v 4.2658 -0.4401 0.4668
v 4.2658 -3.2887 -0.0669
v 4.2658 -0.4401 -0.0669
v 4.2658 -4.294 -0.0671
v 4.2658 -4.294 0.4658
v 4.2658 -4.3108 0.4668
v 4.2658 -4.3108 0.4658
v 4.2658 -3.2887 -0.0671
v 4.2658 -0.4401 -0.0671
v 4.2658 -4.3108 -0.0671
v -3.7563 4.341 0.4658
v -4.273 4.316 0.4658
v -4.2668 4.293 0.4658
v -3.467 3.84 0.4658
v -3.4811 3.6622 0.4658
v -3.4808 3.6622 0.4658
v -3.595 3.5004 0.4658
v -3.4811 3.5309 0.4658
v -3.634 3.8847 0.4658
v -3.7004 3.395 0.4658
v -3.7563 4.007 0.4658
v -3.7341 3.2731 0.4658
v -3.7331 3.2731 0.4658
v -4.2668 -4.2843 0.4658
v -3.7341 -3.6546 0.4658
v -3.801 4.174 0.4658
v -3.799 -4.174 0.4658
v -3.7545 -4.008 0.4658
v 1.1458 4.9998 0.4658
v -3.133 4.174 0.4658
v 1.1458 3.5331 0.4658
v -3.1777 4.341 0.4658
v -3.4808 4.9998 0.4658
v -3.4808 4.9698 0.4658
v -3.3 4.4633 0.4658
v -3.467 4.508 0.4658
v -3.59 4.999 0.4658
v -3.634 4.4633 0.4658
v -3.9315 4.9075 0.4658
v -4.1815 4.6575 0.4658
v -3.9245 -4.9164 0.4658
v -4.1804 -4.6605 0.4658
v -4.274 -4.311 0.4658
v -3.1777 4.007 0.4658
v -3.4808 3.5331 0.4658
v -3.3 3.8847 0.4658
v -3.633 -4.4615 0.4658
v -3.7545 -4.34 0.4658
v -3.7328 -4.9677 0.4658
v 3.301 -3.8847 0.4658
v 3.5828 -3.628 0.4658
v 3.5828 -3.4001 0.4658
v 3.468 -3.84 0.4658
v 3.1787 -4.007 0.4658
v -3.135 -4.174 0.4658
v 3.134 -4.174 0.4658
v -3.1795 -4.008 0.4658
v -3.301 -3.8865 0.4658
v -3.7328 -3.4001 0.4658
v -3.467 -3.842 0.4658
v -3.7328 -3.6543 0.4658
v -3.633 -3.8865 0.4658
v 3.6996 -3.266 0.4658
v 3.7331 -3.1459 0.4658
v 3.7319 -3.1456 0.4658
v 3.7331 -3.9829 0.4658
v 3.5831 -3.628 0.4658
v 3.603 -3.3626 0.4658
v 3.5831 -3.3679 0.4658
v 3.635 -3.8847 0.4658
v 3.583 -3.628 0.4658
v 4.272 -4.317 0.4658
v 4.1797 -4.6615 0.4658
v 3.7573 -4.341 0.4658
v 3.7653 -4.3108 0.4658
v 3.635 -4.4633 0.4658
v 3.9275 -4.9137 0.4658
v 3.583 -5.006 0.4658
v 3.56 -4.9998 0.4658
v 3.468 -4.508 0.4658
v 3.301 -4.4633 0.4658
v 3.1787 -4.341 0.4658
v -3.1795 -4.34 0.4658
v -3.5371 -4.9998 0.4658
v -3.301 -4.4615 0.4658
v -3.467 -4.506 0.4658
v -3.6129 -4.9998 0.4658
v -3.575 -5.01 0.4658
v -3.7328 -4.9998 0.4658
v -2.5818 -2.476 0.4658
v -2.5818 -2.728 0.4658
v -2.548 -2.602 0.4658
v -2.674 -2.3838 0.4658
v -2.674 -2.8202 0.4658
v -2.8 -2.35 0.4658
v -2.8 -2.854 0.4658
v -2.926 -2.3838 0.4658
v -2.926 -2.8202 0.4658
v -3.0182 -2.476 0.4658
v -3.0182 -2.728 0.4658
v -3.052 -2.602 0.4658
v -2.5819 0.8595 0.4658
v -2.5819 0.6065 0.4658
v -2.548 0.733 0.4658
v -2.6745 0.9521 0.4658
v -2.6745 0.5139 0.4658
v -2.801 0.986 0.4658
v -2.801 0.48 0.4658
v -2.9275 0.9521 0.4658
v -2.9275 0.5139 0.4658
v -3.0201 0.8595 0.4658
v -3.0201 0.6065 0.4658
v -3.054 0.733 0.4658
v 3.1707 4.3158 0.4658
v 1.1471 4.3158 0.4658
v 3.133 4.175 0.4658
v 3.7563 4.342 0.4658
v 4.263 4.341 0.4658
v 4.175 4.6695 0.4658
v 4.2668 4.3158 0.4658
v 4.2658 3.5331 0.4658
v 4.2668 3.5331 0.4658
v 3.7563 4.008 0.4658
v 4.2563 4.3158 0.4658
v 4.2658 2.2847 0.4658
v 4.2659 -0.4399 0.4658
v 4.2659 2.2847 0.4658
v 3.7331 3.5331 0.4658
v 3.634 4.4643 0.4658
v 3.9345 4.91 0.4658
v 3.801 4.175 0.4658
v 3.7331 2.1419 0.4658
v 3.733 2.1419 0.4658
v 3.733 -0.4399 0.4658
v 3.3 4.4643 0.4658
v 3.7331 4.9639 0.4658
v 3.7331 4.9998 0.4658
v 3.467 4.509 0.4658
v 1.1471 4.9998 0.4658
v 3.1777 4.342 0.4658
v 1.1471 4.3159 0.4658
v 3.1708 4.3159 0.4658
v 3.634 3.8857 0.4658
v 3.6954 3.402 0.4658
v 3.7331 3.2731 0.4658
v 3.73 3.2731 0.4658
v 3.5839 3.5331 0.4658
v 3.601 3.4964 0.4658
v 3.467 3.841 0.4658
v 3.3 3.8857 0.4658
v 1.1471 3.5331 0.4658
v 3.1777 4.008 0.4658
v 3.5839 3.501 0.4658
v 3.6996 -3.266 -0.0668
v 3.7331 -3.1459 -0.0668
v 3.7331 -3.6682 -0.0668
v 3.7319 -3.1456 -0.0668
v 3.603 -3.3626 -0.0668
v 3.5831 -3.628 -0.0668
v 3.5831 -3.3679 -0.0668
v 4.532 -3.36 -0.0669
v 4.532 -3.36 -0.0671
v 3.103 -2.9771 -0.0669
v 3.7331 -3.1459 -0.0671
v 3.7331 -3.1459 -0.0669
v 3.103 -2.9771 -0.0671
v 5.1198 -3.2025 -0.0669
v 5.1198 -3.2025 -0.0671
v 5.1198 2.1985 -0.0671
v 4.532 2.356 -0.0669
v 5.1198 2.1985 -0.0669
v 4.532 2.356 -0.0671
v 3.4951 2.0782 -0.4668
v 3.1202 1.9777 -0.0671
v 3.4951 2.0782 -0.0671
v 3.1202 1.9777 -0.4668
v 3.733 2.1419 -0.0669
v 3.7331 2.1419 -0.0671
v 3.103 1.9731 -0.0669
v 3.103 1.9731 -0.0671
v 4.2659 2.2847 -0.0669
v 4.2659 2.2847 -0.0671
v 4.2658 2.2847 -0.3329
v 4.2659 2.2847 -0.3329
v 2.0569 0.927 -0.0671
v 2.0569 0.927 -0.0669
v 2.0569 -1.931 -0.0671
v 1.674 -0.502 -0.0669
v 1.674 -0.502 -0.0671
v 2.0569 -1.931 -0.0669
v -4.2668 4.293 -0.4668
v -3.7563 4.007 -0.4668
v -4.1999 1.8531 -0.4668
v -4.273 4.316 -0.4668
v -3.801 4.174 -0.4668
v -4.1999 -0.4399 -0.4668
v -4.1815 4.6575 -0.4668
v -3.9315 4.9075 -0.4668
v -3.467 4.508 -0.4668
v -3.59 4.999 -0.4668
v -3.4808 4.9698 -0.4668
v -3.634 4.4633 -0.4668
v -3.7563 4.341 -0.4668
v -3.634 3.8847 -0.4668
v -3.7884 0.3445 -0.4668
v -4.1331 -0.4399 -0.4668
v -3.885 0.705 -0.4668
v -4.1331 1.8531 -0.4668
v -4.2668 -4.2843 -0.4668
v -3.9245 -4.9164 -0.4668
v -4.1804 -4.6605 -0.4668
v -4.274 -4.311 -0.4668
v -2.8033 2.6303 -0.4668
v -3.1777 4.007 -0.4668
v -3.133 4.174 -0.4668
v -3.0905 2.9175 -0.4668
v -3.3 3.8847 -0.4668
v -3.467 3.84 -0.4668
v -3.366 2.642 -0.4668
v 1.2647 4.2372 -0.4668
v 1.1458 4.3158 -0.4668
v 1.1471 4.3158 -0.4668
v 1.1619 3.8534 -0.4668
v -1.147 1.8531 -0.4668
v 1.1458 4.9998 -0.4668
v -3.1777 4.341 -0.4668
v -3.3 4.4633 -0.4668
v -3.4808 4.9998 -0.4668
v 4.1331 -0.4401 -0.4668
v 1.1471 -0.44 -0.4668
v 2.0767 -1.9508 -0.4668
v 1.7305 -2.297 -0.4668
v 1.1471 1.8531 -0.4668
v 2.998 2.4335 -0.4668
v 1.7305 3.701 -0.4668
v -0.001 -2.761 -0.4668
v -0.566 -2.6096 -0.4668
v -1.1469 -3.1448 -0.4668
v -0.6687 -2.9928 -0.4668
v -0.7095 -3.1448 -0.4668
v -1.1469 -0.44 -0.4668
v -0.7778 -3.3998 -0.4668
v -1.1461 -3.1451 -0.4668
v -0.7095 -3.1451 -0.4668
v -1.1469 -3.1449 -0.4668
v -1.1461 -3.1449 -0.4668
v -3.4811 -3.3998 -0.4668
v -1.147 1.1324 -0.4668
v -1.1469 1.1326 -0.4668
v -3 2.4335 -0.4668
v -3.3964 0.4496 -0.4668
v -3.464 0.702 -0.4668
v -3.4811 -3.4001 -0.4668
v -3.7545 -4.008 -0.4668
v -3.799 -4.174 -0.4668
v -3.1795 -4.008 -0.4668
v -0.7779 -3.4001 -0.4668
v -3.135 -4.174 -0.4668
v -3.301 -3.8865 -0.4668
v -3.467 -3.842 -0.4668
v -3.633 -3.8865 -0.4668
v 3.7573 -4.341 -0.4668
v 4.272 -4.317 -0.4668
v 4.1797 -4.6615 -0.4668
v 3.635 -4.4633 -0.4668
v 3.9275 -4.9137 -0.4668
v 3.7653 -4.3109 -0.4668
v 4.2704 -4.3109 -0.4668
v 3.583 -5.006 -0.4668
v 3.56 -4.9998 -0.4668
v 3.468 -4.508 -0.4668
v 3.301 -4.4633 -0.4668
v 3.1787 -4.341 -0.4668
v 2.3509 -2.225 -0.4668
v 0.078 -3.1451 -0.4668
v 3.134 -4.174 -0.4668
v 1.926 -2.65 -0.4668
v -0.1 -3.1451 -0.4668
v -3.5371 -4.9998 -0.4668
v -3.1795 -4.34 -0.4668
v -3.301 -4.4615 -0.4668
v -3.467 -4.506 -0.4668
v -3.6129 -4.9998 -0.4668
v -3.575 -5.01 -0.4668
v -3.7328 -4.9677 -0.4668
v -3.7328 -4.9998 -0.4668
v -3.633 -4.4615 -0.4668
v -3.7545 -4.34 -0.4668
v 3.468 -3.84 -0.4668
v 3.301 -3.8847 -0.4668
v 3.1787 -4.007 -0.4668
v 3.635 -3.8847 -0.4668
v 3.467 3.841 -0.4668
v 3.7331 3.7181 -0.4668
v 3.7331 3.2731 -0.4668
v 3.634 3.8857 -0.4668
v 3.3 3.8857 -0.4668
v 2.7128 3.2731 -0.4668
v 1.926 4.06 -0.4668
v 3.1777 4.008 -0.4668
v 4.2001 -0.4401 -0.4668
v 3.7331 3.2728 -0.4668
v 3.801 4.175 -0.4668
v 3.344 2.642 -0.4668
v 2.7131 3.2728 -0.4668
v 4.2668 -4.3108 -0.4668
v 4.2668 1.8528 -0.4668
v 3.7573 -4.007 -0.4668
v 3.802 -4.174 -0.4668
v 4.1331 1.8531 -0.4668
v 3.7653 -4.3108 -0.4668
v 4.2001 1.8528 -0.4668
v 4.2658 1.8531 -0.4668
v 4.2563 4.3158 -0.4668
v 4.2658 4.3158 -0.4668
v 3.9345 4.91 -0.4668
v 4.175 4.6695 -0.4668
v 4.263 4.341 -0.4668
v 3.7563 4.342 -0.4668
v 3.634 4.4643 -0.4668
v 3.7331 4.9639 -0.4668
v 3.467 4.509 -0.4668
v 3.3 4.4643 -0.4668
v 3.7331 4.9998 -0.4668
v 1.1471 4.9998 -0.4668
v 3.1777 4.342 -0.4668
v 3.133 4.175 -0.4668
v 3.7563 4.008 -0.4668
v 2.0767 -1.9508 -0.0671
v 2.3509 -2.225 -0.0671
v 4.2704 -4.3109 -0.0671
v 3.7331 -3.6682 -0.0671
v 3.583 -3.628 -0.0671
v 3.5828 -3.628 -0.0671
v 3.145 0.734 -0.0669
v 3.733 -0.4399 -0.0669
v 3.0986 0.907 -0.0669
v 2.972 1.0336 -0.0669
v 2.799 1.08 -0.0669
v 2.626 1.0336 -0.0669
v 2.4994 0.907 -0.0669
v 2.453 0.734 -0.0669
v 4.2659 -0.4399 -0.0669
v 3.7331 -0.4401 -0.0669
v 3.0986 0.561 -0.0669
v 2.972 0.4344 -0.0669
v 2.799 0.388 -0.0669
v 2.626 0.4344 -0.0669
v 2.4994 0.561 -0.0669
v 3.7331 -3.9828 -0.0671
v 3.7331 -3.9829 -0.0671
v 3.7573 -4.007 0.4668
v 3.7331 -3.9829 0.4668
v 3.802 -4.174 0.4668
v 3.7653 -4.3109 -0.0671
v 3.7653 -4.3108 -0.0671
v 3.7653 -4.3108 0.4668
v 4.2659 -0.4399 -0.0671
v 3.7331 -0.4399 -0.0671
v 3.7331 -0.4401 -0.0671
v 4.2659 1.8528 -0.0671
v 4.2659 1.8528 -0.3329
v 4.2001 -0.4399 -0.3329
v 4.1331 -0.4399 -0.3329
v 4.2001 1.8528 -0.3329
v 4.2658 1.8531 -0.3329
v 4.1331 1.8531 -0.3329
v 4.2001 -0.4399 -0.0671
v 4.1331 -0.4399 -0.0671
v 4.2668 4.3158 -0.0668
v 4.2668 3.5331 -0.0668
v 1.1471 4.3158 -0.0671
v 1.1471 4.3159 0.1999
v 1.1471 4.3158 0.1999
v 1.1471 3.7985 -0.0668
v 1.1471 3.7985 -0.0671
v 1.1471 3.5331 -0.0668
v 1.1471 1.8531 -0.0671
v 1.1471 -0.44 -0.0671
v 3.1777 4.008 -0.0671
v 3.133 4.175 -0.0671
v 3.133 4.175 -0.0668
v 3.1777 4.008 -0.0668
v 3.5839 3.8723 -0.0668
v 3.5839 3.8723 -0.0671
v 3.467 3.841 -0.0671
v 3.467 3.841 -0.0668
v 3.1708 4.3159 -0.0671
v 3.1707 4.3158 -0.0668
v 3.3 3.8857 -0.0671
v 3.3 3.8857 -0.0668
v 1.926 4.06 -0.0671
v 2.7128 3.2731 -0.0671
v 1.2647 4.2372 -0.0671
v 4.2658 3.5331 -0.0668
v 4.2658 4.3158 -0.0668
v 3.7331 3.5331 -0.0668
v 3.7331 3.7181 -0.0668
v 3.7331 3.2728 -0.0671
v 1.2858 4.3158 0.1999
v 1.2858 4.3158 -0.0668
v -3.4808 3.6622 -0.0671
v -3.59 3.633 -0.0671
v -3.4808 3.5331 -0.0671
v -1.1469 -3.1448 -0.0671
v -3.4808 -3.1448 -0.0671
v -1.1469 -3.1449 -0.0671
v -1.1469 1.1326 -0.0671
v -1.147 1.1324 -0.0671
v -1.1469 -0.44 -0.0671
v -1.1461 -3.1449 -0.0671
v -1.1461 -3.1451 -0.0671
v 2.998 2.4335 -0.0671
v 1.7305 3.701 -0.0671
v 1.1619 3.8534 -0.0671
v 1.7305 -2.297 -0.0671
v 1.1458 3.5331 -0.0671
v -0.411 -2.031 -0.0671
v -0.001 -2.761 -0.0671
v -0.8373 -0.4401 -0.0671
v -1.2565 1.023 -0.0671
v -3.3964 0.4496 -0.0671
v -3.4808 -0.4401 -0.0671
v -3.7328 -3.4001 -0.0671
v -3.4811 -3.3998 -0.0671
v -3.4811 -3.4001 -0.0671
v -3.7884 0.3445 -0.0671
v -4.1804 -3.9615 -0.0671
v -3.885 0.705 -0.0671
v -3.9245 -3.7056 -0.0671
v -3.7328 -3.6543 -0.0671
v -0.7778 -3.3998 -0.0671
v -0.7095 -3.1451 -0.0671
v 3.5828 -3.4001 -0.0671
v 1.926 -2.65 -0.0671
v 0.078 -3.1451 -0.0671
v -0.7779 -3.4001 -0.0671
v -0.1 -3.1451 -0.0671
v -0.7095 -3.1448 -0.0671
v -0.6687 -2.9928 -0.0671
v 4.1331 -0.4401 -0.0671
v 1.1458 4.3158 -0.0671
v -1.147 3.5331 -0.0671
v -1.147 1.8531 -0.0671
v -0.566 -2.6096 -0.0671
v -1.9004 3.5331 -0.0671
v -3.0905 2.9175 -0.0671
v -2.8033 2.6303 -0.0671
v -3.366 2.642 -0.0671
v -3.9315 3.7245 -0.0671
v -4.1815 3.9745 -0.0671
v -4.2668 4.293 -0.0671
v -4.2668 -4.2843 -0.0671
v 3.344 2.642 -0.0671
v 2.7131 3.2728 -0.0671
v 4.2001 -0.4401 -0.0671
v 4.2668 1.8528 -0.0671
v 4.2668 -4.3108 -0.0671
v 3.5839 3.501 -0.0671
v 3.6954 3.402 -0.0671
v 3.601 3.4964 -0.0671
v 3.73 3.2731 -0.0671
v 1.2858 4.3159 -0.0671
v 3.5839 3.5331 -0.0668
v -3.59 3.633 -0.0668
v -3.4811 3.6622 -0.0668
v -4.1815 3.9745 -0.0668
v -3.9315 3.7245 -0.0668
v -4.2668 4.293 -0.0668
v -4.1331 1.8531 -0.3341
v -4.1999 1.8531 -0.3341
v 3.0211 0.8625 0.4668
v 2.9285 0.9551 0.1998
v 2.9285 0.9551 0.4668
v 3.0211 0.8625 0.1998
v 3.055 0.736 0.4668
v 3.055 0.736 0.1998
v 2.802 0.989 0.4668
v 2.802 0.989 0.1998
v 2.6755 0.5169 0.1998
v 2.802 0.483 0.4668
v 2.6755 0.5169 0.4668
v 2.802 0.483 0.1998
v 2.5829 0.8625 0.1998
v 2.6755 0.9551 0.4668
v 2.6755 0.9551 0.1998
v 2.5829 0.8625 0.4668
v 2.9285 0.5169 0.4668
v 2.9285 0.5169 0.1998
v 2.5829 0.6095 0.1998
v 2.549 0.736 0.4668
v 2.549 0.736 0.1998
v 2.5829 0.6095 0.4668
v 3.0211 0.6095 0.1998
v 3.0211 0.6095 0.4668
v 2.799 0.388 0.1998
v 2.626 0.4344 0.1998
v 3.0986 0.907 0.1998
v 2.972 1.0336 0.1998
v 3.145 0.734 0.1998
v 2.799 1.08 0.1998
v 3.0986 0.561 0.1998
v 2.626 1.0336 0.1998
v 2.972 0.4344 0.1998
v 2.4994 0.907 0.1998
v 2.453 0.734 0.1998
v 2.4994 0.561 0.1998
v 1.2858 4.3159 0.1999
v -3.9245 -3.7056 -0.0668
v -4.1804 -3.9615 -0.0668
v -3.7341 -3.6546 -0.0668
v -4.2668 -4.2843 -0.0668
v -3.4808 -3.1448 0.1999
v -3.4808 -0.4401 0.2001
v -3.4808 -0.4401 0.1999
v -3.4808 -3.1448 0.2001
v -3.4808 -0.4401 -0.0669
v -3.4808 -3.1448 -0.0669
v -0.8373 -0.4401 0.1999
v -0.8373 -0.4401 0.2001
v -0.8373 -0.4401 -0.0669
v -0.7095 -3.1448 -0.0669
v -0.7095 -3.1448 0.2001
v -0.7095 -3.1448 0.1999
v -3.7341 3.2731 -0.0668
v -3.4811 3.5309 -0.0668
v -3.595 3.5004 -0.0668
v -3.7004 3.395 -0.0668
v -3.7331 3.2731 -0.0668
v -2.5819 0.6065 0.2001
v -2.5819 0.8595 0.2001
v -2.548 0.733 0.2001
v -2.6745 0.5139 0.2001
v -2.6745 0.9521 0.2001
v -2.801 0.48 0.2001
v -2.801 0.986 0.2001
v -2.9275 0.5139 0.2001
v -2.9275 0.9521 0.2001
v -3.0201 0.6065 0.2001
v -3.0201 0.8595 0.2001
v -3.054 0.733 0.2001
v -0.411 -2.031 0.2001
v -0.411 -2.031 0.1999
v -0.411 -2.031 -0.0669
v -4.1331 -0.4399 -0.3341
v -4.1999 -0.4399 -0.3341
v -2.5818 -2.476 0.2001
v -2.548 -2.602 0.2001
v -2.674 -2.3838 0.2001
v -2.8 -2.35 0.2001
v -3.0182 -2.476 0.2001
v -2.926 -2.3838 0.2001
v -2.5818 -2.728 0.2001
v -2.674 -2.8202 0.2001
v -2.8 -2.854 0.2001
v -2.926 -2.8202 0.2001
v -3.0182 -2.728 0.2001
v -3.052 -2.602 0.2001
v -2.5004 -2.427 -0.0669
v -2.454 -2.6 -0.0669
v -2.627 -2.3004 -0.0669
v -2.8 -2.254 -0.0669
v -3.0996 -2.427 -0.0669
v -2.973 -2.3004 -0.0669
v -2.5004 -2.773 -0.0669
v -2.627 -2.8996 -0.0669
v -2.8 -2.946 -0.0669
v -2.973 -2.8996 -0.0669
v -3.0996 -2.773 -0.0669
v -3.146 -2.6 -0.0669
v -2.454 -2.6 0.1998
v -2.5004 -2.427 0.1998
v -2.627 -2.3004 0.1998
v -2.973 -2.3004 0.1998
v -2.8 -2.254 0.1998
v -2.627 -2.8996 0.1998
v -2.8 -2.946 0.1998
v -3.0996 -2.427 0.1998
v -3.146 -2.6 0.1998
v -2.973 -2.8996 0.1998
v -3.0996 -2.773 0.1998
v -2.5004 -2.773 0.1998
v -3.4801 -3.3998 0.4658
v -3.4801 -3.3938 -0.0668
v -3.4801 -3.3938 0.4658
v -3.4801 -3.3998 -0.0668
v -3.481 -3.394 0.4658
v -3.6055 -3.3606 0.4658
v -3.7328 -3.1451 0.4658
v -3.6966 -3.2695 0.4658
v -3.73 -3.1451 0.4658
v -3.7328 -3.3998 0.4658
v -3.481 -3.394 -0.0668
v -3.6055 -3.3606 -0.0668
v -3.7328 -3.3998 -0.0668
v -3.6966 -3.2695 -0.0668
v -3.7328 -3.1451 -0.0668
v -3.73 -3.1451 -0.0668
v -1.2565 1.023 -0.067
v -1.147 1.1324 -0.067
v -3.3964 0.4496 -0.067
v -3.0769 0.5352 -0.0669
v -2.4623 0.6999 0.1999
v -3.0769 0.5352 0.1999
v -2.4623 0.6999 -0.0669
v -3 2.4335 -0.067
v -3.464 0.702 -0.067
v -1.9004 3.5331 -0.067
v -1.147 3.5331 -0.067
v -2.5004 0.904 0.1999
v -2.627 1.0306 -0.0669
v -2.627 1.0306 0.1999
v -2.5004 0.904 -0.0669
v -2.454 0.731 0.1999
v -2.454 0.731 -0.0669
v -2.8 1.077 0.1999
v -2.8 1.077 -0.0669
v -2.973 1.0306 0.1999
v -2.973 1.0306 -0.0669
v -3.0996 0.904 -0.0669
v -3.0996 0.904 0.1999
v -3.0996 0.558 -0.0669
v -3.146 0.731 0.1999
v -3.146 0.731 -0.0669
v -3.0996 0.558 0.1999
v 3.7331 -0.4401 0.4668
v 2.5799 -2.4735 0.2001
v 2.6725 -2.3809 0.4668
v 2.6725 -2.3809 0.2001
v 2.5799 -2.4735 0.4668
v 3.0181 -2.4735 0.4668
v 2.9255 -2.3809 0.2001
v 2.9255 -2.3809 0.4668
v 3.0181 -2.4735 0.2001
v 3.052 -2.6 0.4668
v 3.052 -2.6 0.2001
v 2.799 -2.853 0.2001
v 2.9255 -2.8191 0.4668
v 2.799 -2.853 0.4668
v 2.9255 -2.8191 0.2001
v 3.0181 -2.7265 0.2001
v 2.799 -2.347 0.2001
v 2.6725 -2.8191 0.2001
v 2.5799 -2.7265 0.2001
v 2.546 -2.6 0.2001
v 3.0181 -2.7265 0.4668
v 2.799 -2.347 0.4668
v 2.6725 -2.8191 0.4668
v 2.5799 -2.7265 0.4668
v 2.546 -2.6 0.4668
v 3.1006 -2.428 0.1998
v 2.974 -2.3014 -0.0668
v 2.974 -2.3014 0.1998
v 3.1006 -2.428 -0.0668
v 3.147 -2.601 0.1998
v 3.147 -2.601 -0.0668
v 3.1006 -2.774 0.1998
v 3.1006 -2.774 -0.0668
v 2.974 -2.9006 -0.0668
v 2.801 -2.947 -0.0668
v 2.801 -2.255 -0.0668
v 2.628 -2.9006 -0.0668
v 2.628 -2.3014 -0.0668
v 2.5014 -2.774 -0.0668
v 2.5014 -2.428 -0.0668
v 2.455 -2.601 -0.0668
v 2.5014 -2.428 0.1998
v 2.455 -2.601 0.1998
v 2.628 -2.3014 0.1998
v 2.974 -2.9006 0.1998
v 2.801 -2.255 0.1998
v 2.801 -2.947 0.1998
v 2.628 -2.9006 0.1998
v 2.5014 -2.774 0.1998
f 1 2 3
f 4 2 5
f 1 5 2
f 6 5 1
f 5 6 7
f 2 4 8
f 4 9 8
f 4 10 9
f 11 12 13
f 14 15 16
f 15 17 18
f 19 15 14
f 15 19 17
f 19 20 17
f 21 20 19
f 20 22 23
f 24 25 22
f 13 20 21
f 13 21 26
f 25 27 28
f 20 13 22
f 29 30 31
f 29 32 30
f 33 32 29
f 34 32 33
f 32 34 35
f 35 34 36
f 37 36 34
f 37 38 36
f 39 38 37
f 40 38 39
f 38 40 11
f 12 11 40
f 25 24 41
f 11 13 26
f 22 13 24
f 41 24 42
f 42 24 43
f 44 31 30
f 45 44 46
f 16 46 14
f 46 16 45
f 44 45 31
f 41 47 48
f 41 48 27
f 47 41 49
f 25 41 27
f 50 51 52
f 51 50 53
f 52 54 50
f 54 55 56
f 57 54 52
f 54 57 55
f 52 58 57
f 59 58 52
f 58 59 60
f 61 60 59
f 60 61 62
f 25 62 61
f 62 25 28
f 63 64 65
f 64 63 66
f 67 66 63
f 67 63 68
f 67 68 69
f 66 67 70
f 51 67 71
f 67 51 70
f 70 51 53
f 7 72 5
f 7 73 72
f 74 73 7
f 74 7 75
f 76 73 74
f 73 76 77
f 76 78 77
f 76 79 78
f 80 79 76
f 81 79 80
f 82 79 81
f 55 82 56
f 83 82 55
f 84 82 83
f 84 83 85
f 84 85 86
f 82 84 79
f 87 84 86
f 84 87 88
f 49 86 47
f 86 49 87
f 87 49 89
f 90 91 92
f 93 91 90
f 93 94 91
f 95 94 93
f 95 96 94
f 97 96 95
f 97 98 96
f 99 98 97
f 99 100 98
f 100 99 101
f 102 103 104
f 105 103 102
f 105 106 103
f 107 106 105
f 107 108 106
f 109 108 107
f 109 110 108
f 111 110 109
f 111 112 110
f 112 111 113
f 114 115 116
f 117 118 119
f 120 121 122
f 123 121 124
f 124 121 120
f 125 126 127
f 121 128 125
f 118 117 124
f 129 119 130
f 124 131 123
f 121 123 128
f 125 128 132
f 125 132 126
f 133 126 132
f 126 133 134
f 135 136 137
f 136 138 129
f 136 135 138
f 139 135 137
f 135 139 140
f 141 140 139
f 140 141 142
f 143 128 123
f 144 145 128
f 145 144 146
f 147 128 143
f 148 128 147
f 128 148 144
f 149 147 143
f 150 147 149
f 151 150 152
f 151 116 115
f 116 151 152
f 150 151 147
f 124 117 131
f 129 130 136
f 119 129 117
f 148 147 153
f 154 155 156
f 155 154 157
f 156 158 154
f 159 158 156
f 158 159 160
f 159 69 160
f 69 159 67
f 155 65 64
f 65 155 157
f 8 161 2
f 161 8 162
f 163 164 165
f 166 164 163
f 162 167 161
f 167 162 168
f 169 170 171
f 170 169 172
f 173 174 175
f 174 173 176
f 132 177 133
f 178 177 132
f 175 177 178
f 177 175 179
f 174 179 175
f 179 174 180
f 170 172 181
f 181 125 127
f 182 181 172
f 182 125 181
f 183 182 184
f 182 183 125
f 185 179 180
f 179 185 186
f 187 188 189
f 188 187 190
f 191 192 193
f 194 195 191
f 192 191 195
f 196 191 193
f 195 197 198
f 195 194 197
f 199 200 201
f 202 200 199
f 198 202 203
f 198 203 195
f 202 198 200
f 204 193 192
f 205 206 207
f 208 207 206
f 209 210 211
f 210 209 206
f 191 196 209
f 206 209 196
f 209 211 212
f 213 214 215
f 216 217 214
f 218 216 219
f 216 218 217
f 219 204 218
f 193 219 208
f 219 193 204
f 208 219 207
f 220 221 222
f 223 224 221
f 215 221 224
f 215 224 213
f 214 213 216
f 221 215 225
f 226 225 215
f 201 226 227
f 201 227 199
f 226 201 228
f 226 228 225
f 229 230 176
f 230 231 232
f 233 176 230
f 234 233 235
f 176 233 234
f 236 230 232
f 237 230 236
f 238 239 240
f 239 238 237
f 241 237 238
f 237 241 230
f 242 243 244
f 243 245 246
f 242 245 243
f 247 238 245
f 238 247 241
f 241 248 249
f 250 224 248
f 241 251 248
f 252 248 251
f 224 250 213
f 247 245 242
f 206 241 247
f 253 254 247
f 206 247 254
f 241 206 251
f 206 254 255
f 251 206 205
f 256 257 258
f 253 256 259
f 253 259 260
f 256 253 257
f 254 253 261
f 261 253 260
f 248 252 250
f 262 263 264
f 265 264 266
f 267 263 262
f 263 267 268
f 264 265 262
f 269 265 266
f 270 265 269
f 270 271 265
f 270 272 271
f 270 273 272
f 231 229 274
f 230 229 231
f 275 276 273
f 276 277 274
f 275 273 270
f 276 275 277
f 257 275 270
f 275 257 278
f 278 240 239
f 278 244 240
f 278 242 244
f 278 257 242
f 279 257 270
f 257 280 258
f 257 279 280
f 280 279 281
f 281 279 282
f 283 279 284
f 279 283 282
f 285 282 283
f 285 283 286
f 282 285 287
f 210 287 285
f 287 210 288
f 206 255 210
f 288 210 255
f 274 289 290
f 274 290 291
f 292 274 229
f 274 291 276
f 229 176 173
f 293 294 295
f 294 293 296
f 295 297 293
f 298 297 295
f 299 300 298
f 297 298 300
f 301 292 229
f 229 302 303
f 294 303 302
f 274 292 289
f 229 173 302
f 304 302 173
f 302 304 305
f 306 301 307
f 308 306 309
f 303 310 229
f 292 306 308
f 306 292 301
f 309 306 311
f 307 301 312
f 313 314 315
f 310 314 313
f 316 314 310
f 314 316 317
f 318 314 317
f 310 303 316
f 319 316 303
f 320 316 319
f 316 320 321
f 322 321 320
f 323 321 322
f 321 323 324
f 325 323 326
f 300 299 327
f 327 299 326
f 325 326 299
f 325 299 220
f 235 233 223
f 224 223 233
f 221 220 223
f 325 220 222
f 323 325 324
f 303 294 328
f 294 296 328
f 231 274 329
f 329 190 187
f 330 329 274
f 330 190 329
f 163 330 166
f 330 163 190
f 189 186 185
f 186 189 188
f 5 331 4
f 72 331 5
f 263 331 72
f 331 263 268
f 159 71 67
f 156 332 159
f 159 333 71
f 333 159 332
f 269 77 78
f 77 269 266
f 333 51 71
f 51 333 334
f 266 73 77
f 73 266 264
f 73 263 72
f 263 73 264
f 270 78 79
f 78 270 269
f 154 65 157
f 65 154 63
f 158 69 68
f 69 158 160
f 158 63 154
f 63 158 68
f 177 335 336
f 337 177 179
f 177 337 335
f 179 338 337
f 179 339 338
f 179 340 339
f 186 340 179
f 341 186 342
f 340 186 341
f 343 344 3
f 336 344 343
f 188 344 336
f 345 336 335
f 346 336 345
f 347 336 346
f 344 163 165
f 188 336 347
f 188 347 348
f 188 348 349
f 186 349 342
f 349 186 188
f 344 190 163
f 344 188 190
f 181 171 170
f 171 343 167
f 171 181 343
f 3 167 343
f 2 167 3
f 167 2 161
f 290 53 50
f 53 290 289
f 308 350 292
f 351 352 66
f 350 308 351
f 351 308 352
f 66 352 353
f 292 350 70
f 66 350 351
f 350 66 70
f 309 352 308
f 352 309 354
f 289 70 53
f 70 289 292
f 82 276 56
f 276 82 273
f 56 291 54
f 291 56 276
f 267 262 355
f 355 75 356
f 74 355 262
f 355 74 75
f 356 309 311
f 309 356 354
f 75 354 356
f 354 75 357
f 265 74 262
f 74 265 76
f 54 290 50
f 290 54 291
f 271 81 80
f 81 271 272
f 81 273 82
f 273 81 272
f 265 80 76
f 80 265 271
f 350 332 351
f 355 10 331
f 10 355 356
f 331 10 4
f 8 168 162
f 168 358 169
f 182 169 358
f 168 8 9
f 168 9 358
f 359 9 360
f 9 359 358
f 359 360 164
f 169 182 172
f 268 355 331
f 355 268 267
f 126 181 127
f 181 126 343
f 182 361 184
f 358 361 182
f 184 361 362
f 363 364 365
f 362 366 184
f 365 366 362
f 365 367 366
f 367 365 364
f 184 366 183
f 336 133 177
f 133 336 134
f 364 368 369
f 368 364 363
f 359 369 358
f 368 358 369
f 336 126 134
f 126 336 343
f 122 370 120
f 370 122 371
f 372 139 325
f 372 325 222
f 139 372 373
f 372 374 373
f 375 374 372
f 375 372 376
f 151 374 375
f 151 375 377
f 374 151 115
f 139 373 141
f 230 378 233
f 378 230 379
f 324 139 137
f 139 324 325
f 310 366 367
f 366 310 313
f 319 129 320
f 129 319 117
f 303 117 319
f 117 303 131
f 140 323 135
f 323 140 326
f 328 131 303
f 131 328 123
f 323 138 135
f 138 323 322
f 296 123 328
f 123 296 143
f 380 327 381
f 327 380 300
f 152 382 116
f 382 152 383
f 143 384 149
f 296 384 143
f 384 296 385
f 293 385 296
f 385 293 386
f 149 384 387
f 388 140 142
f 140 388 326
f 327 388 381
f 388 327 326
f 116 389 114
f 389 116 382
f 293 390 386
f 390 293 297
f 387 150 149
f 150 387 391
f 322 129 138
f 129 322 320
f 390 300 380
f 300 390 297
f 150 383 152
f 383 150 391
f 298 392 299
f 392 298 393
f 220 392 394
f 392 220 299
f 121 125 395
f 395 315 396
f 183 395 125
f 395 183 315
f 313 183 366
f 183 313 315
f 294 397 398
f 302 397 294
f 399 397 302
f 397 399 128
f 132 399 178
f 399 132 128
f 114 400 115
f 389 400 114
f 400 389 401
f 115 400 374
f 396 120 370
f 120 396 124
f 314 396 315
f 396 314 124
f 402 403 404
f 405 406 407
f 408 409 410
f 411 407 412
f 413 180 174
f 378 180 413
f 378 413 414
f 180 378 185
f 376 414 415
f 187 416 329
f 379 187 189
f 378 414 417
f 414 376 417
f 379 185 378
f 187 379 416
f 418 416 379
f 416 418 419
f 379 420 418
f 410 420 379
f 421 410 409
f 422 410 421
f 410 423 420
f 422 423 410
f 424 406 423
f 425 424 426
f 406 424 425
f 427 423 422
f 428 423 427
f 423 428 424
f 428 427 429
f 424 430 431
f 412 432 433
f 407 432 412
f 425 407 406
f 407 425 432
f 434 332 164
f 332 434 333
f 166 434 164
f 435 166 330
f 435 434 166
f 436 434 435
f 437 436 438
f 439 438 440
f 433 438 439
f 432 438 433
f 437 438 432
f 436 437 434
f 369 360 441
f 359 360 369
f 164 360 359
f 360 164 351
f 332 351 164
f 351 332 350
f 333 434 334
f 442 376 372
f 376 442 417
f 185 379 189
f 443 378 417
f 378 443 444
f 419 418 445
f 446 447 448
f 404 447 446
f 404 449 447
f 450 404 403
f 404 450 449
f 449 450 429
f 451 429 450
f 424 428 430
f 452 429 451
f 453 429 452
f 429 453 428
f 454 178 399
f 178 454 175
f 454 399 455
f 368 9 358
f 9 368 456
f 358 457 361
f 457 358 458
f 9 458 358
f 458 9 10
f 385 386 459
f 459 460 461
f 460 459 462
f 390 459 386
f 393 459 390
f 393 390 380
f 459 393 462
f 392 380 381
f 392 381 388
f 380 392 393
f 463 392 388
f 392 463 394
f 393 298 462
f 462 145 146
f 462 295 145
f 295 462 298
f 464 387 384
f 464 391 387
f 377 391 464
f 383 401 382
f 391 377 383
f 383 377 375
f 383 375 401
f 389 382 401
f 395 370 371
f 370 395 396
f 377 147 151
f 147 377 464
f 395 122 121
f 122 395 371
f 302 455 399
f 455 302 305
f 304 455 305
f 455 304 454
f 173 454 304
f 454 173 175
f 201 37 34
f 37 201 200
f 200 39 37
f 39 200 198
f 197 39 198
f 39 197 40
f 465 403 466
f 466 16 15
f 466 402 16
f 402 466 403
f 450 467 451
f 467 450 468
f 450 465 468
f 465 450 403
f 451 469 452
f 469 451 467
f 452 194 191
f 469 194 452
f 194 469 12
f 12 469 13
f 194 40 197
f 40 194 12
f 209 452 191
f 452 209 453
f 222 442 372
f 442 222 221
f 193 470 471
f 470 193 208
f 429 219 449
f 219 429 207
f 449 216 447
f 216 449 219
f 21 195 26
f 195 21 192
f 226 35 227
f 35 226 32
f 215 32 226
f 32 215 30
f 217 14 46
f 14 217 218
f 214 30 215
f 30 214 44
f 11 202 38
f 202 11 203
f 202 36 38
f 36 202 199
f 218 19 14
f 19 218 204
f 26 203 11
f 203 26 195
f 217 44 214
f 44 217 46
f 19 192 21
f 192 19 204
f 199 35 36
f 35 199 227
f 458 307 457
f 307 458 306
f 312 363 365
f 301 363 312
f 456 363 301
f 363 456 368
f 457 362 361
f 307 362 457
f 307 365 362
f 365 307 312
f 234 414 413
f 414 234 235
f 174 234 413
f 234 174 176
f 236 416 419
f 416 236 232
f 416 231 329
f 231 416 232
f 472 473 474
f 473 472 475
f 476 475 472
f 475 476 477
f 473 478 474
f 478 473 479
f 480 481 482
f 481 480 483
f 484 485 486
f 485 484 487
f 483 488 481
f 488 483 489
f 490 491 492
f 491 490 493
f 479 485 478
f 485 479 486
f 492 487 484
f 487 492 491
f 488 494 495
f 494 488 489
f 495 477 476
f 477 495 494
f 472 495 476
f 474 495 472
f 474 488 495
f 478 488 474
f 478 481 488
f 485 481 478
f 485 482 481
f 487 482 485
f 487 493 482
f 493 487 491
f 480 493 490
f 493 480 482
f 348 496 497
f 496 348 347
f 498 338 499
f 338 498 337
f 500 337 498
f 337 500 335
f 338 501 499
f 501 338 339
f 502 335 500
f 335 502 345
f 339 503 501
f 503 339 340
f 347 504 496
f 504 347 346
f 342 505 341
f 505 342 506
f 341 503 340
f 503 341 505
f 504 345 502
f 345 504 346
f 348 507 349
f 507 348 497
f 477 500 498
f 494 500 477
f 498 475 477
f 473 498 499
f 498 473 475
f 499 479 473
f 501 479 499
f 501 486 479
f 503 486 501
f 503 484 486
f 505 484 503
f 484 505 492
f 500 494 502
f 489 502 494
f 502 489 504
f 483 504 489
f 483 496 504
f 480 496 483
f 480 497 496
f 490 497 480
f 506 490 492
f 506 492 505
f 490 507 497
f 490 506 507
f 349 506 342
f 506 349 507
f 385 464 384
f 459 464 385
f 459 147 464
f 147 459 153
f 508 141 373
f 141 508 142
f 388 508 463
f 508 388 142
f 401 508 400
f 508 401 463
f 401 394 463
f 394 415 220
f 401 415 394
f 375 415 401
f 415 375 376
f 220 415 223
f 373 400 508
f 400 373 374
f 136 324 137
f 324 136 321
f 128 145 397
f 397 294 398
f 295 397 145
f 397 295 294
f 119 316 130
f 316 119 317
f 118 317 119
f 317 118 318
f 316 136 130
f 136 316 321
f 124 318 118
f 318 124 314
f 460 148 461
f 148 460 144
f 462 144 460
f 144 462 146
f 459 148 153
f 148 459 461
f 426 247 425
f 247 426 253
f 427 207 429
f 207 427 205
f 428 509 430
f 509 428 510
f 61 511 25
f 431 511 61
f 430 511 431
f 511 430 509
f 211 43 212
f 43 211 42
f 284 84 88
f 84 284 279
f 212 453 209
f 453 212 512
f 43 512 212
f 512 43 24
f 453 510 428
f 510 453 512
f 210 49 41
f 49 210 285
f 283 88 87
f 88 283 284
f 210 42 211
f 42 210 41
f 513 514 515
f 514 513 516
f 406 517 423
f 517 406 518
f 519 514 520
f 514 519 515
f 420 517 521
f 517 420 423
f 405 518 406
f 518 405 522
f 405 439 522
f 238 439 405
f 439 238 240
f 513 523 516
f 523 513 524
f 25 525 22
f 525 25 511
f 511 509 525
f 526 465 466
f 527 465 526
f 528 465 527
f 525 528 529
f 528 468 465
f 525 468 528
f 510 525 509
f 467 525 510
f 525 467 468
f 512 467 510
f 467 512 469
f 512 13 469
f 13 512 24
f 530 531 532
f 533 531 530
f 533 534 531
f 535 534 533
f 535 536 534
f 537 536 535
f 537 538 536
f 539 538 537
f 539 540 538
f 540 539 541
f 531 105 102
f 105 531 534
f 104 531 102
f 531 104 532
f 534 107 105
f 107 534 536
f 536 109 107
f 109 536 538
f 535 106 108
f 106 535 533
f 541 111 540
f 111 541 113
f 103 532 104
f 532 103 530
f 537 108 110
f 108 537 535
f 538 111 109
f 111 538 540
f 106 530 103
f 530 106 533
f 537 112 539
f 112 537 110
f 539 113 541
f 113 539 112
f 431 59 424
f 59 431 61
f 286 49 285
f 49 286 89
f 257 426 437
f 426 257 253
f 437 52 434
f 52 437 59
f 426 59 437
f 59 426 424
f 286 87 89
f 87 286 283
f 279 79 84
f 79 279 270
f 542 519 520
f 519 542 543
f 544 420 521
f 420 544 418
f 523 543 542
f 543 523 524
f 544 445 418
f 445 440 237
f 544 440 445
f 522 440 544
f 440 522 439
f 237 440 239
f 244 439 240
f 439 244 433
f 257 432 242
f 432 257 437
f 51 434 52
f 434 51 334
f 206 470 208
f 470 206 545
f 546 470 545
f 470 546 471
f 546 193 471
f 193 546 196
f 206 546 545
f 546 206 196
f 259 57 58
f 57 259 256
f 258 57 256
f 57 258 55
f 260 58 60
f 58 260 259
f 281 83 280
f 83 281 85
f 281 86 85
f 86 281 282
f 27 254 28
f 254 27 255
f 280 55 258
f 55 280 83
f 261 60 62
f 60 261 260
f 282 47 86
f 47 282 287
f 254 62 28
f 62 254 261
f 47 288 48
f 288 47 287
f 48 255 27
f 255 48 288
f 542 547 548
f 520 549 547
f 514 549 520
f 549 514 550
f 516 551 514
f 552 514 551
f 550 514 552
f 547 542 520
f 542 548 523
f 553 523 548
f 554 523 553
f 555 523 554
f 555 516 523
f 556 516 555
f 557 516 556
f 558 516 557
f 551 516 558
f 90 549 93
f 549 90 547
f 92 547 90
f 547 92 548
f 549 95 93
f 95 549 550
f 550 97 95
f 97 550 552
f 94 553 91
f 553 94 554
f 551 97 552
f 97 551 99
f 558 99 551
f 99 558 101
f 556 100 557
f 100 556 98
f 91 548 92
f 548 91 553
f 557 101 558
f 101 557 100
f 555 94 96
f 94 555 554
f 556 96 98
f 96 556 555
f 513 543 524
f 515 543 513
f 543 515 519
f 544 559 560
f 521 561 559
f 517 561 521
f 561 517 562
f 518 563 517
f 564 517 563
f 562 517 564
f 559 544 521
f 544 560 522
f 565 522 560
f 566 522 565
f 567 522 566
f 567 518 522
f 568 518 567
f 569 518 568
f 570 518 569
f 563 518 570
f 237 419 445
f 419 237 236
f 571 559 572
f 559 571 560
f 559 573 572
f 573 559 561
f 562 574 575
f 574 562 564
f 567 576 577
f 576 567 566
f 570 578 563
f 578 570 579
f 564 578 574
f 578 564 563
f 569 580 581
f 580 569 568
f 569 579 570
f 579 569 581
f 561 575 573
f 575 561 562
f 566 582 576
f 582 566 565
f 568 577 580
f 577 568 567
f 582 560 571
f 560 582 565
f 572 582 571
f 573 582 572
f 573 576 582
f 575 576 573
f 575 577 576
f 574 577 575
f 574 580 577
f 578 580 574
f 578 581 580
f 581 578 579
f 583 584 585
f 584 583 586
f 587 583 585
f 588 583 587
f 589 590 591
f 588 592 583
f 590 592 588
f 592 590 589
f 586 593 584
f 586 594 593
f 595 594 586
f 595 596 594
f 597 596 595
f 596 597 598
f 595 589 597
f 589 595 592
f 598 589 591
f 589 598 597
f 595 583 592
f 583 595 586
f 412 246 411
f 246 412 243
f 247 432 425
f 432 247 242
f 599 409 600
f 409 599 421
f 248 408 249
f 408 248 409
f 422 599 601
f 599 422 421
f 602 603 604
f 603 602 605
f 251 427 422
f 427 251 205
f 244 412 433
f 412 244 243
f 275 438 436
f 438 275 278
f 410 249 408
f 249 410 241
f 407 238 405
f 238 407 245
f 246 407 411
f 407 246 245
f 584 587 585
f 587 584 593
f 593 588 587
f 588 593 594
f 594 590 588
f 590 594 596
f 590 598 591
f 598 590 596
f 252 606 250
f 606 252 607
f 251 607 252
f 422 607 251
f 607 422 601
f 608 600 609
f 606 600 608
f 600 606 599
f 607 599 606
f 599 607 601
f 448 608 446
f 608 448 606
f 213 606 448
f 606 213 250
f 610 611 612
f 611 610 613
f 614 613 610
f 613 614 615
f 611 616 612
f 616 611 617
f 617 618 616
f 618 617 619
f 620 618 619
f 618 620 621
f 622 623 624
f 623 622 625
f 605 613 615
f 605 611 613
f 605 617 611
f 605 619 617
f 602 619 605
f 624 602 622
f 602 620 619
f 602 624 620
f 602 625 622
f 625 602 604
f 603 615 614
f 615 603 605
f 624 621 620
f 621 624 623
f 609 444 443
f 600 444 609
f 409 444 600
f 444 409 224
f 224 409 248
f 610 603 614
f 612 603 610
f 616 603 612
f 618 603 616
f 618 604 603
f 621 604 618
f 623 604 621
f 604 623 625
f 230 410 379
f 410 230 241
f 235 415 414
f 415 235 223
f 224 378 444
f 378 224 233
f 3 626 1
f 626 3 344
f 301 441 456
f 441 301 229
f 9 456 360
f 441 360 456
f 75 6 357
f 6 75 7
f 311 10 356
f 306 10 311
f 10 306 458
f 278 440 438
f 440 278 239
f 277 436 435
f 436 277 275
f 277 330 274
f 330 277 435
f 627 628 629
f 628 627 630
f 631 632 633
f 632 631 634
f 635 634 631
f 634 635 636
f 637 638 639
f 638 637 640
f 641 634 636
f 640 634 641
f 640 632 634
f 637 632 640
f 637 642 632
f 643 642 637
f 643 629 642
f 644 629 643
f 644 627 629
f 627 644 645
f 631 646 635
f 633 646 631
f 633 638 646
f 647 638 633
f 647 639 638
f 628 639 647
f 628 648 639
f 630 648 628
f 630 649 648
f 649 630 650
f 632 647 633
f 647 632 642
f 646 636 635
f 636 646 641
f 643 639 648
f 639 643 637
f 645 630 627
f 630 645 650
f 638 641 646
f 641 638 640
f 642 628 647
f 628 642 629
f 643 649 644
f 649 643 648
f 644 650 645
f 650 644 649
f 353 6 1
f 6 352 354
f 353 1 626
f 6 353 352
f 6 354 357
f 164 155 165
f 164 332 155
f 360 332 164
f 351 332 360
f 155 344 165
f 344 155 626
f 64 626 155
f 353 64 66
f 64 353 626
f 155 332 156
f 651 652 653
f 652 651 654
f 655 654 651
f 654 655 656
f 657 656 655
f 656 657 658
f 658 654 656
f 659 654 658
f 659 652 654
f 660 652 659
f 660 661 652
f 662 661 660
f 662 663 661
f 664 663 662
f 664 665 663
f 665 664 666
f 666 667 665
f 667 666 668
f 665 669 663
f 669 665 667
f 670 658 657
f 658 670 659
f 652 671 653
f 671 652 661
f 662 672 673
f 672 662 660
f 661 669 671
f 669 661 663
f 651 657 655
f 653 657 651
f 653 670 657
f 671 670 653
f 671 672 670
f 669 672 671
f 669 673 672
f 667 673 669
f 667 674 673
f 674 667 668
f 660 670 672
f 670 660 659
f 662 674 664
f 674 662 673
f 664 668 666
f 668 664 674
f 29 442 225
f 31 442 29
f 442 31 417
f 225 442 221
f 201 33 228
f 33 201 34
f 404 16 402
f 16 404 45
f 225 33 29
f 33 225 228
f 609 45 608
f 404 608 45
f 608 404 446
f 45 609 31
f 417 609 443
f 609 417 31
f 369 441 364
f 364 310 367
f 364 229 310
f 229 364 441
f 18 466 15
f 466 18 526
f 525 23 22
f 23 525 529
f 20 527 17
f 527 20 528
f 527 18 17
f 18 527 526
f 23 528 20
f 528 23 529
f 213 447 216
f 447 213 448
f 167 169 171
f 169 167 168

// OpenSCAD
intersection() {
  cube(size = [10.2397, 11.9997, 1.1197], center = true);

  union() {
    difference() {
      difference() {
        union() {
          translate([3.9245, -2.3755, 0.1995])
          cube(size = [0.6827, 3.8707, 0.5327], center = true);
        
          translate([4.532, -0.502, -0.0005])
          cylinder(h = 0.9327, r1 = 2.858, r2 = 2.858, center = true, $fn = 12);
        
          translate([3.583, -4.317, -0.0005])
          cylinder(h = 0.9327, r1 = 0.689, r2 = 0.689, center = true, $fn = 12);
        }
      
        translate([3.471, -3.134, 9.0165])
        cylinder(h = 18.1668, r1 = 0.264, r2 = 0.264, center = true, $fn = 12);
      }
    
      difference() {
        union() {
          translate([3.468, -4.174, 8.8165])
          cylinder(h = 18.5668, r1 = 0.334, r2 = 0.334, center = true, $fn = 12);
        
          translate([4.532, -0.502, 0.1995])
          cylinder(h = 0.5328, r1 = 2.858, r2 = 2.858, center = true, $fn = 12);
        
          translate([10.9165, 6.894, -0.267])
          cube(size = [14.3668, 22.4098, 0.3998], center = true);
        }
      
        translate([3.9995, 8.83, 8.8835])
        cube(size = [0.5329, 18.5399, 18.4329], center = true);
      }
    }
  
    intersection() {
      difference() {
        difference() {
          translate([2.707, 3.4265, 0])
          cube(size = [3.1197, 3.1467, 36.1997], center = true);
        
          translate([3.467, 4.175, 0])
          cylinder(h = 36.1998, r1 = 0.334, r2 = 0.334, center = true, $fn = 12);
        }
      
        translate([-0.011, 0.705, -9.0835])
        cylinder(h = 18.0328, r1 = 3.874, r2 = 3.874, center = true, $fn = 12);
      }
    
      union() {
        translate([3.9995, 3.0845, -0.0005])
        cube(size = [0.5327, 2.4627, 0.9327], center = true);
      
        translate([0.126, 10.6865, -0.267])
        cube(size = [7.2137, 14.8267, 0.3997], center = true);
      
        translate([9.6235, 3.9245, 0.1995])
        cube(size = [16.9527, 0.7827, 0.5327], center = true);
      }
    }
  
    difference() {
      translate([2.6405, 2.563, -0.267])
      cube(size = [2.9867, 1.4197, 0.3997], center = true);
    
      translate([-0.011, 0.705, -0.267])
      cylinder(h = 0.3998, r1 = 3.874, r2 = 3.874, center = true, $fn = 12);
    }
  
    difference() {
      intersection() {
        translate([-4.354, 6.388, 8.8165])
        cylinder(h = 18.5667, r1 = 6.195, r2 = 6.195, center = true, $fn = 12);
      
        difference() {
          union() {
            translate([-3.59, 4.316, -0.0005])
            cylinder(h = 0.9327, r1 = 0.683, r2 = 0.683, center = true, $fn = 12);
          
            translate([6.9165, 3.0845, -0.267])
            cube(size = [22.3667, 2.4627, 0.3997], center = true);
          }
        
          translate([-0.011, 0.705, -9.0835])
          cylinder(h = 18.0328, r1 = 3.874, r2 = 3.874, center = true, $fn = 12);
        }
      }
    
      translate([-3.467, 4.174, 0])
      cylinder(h = 36.1998, r1 = 0.334, r2 = 0.334, center = true, $fn = 12);
    }
  
    difference() {
      union() {
        translate([9.6235, 4.1365, -0.0005])
        cube(size = [16.9527, 1.7267, 0.9327], center = true);
      
        intersection() {
          translate([4.2335, -8.1235, -0.267])
          cube(size = [0.0667, 19.9527, 0.3997], center = true);
        
          translate([4.532, -0.502, -9.0835])
          cylinder(h = 18.0327, r1 = 2.858, r2 = 2.858, center = true, $fn = 12);
        }
      
        translate([2.799, 0.734, -0.1335])
        cylinder(h = 0.6667, r1 = 0.346, r2 = 0.346, center = true, $fn = 12);
      
        intersection() {
          translate([2.4405, -7.2835, 8.8165])
          cube(size = [2.5867, 21.6327, 18.5667], center = true);
        
          union() {
            translate([-0.001, 0.702, -0.267])
            cylinder(h = 0.3997, r1 = 3.463, r2 = 3.463, center = true, $fn = 12);
          
            translate([2.802, 0.736, -8.8165])
            cylinder(h = 18.5667, r1 = 0.253, r2 = 0.253, center = true, $fn = 12);
          }
        }
      }
    
      union() {
        difference() {
          translate([2.3655, 3.7945, -8.8165])
          cube(size = [2.4368, 1.0428, 18.5668], center = true);
        
          translate([-4.354, 6.388, -0.1335])
          cylinder(h = 0.6669, r1 = 6.195, r2 = 6.195, center = true, $fn = 12);
        }
      
        translate([3.467, 4.175, 8.8165])
        cylinder(h = 18.5668, r1 = 0.334, r2 = 0.334, center = true, $fn = 12);
      
        translate([3.472, 3.273, 8.8165])
        cylinder(h = 18.5668, r1 = 0.258, r2 = 0.258, center = true, $fn = 12);
      
        difference() {
          translate([10.9165, 4.1365, 0])
          cube(size = [14.3668, 1.7268, 36.1998], center = true);
        
          translate([3.606, 4.341, 0])
          cylinder(h = 36.1999, r1 = 0.657, r2 = 0.657, center = true, $fn = 12);
        }
      }
    }
  
    intersection() {
      union() {
        translate([-3.575, -4.311, 0])
        cylinder(h = 36.1997, r1 = 0.699, r2 = 0.699, center = true, $fn = 12);
      
        difference() {
          translate([-3.874, 6.894, -0.267])
          cube(size = [0.7857, 22.4097, 0.3997], center = true);
        
          translate([-0.011, 0.705, -9.0835])
          cylinder(h = 18.0328, r1 = 3.874, r2 = 3.874, center = true, $fn = 12);
        }
      
        translate([0.051, -1.7925, -0.0005])
        cube(size = [7.0637, 2.7047, 0.9327], center = true);
      
        translate([-4.0005, 6.894, 0.1995])
        cube(size = [0.5327, 22.4097, 0.5327], center = true);
      
        translate([-2.801, 0.733, 9.15])
        cylinder(h = 17.8997, r1 = 0.253, r2 = 0.253, center = true, $fn = 12);
      
        translate([-0.0745, -4.2, -0.0005])
        cube(size = [7.3167, 1.5997, 0.9327], center = true);
      }
    
      difference() {
        difference() {
          union() {
            translate([-6.61, -2.031, -0.0005])
            cylinder(h = 0.9327, r1 = 6.199, r2 = 6.199, center = true, $fn = 12);
          
            translate([-0.342, -10.6225, -0.0005])
            cube(size = [7.8497, 14.9547, 0.9327], center = true);
          }
        
          union() {
            translate([-4.1665, 8.83, -0.4005])
            cube(size = [0.0668, 18.5398, 0.1328], center = true);
          
            translate([-3.467, -4.174, -8.8165])
            cylinder(h = 18.5668, r1 = 0.332, r2 = 0.332, center = true, $fn = 12);
          }
        }
      
        union() {
          translate([3.583, -4.317, 8.8165])
          cylinder(h = 18.5668, r1 = 0.689, r2 = 0.689, center = true, $fn = 12);
        
          translate([0.051, -1.92, 0.0665])
          cube(size = [7.0638, 2.9598, 0.2668], center = true);
        
          difference() {
            translate([0.051, -1.7925, 0.3335])
            cube(size = [7.0638, 2.7048, 0.2668], center = true);
          
            translate([-2.8, -2.602, 9.0165])
            cylinder(h = 18.1669, r1 = 0.252, r2 = 0.252, center = true, $fn = 12);
          }
        }
      }
    }
  
    difference() {
      union() {
        translate([-0.001, 0.702, -0.267])
        cylinder(h = 0.3997, r1 = 3.463, r2 = 3.463, center = true, $fn = 12);
      
        translate([-2.8, -2.6, -0.1335])
        cylinder(h = 0.6667, r1 = 0.346, r2 = 0.346, center = true, $fn = 12);
      
        translate([-3.6065, -3.2725, 0.1995])
        cube(size = [0.2527, 0.2547, 0.5327], center = true);
      
        translate([-2.6395, 7.35, -0.267])
        cube(size = [2.9867, 21.4997, 0.3997], center = true);
      
        translate([-4.354, 6.388, 8.8835])
        cylinder(h = 18.4327, r1 = 6.195, r2 = 6.195, center = true, $fn = 12);
      
        translate([1.218, -3.2725, -0.267])
        cube(size = [4.7297, 0.2547, 0.3997], center = true);
      }
    
      difference() {
        union() {
          translate([8.4765, 7.4775, -8.95])
          cube(size = [19.2468, 21.2448, 18.2998], center = true);
        
          translate([-3.481, -3.145, 9.0165])
          cylinder(h = 18.1668, r1 = 0.249, r2 = 0.249, center = true, $fn = 12);
        
          translate([-4.354, 6.388, 8.8165])
          cylinder(h = 18.5668, r1 = 6.195, r2 = 6.195, center = true, $fn = 12);
        }
      
        intersection() {
          union() {
            translate([-0.001, 0.702, -9.0835])
            cylinder(h = 18.0329, r1 = 3.463, r2 = 3.463, center = true, $fn = 12);
          
            translate([-2.8, 0.731, 9.0165])
            cylinder(h = 18.1669, r1 = 0.346, r2 = 0.346, center = true, $fn = 12);
          }
        
          union() {
            translate([-9.6235, 7.4775, -8.95])
            cube(size = [16.9529, 21.2449, 18.2999], center = true);
          
            translate([7.1835, -1.92, -8.95])
            cube(size = [21.8329, 2.9599, 18.2999], center = true);
          }
        }
      }
    }
  
    intersection() {
      translate([-0.001, 0.702, -0.267])
      cylinder(h = 0.3997, r1 = 3.463, r2 = 3.463, center = true, $fn = 12);
    
      translate([0.051, 3.4265, -0.267])
      cube(size = [7.0637, 3.1467, 0.3997], center = true);
    }
  
    difference() {
      union() {
        difference() {
          translate([-6.9165, -2.3755, -0.267])
          cube(size = [22.3667, 3.8707, 0.3997], center = true);
        
          translate([-0.011, 0.705, 8.8165])
          cylinder(h = 18.5668, r1 = 3.874, r2 = 3.874, center = true, $fn = 12);
        }
      
        translate([2.799, -2.6, 0.3335])
        cylinder(h = 0.2667, r1 = 0.253, r2 = 0.253, center = true, $fn = 12);
      
        translate([3.9995, -2.3755, 0.067])
        cube(size = [0.5327, 3.8707, 0.7997], center = true);
      
        translate([2.801, -2.601, 0.0665])
        cylinder(h = 0.2667, r1 = 0.346, r2 = 0.346, center = true, $fn = 12);
      }
    
      union() {
        translate([3.468, -4.174, 8.8165])
        cylinder(h = 18.5668, r1 = 0.334, r2 = 0.334, center = true, $fn = 12);
      
        translate([-6.61, -2.031, -0.267])
        cylinder(h = 0.3998, r1 = 6.199, r2 = 6.199, center = true, $fn = 12);
      }
    }
  
    difference() {
      union() {
        translate([4.532, -0.502, -0.267])
        cylinder(h = 0.3997, r1 = 2.858, r2 = 2.858, center = true, $fn = 12);
      
        translate([-1.1675, 4.2665, -0.0005])
        cube(size = [4.6267, 1.4667, 0.9327], center = true);
      }
    
      union() {
        translate([11.1165, 0, -0.0005])
        cube(size = [13.9668, 36.1998, 0.9328], center = true);
      
        translate([-3.59, 4.316, 0])
        cylinder(h = 36.1998, r1 = 0.683, r2 = 0.683, center = true, $fn = 12);
      }
    }
  
    difference() {
      difference() {
        union() {
          translate([-3.874, 3.7945, 0.1995])
          cube(size = [0.7857, 1.0427, 0.5327], center = true);
        
          intersection() {
            translate([-4.354, 6.388, 8.8165])
            cylinder(h = 18.5667, r1 = 6.195, r2 = 6.195, center = true, $fn = 12);
          
            translate([7.3095, 3.0845, -9.0835])
            cube(size = [21.5807, 2.4627, 18.0327], center = true);
          }
        }
      
        intersection() {
          translate([6.9165, -6.892, -8.8165])
          cube(size = [22.3668, 22.4158, 18.5668], center = true);
        
          union() {
            translate([-3.451, 3.251, 0.1995])
            cylinder(h = 0.5328, r1 = 0.288, r2 = 0.288, center = true, $fn = 12);
          
            translate([-6.61, -2.031, -0.267])
            cylinder(h = 0.3998, r1 = 6.199, r2 = 6.199, center = true, $fn = 12);
          }
        }
      }
    
      translate([-3.467, 4.174, 8.8165])
      cylinder(h = 18.5668, r1 = 0.334, r2 = 0.334, center = true, $fn = 12);
    }
  }
}
